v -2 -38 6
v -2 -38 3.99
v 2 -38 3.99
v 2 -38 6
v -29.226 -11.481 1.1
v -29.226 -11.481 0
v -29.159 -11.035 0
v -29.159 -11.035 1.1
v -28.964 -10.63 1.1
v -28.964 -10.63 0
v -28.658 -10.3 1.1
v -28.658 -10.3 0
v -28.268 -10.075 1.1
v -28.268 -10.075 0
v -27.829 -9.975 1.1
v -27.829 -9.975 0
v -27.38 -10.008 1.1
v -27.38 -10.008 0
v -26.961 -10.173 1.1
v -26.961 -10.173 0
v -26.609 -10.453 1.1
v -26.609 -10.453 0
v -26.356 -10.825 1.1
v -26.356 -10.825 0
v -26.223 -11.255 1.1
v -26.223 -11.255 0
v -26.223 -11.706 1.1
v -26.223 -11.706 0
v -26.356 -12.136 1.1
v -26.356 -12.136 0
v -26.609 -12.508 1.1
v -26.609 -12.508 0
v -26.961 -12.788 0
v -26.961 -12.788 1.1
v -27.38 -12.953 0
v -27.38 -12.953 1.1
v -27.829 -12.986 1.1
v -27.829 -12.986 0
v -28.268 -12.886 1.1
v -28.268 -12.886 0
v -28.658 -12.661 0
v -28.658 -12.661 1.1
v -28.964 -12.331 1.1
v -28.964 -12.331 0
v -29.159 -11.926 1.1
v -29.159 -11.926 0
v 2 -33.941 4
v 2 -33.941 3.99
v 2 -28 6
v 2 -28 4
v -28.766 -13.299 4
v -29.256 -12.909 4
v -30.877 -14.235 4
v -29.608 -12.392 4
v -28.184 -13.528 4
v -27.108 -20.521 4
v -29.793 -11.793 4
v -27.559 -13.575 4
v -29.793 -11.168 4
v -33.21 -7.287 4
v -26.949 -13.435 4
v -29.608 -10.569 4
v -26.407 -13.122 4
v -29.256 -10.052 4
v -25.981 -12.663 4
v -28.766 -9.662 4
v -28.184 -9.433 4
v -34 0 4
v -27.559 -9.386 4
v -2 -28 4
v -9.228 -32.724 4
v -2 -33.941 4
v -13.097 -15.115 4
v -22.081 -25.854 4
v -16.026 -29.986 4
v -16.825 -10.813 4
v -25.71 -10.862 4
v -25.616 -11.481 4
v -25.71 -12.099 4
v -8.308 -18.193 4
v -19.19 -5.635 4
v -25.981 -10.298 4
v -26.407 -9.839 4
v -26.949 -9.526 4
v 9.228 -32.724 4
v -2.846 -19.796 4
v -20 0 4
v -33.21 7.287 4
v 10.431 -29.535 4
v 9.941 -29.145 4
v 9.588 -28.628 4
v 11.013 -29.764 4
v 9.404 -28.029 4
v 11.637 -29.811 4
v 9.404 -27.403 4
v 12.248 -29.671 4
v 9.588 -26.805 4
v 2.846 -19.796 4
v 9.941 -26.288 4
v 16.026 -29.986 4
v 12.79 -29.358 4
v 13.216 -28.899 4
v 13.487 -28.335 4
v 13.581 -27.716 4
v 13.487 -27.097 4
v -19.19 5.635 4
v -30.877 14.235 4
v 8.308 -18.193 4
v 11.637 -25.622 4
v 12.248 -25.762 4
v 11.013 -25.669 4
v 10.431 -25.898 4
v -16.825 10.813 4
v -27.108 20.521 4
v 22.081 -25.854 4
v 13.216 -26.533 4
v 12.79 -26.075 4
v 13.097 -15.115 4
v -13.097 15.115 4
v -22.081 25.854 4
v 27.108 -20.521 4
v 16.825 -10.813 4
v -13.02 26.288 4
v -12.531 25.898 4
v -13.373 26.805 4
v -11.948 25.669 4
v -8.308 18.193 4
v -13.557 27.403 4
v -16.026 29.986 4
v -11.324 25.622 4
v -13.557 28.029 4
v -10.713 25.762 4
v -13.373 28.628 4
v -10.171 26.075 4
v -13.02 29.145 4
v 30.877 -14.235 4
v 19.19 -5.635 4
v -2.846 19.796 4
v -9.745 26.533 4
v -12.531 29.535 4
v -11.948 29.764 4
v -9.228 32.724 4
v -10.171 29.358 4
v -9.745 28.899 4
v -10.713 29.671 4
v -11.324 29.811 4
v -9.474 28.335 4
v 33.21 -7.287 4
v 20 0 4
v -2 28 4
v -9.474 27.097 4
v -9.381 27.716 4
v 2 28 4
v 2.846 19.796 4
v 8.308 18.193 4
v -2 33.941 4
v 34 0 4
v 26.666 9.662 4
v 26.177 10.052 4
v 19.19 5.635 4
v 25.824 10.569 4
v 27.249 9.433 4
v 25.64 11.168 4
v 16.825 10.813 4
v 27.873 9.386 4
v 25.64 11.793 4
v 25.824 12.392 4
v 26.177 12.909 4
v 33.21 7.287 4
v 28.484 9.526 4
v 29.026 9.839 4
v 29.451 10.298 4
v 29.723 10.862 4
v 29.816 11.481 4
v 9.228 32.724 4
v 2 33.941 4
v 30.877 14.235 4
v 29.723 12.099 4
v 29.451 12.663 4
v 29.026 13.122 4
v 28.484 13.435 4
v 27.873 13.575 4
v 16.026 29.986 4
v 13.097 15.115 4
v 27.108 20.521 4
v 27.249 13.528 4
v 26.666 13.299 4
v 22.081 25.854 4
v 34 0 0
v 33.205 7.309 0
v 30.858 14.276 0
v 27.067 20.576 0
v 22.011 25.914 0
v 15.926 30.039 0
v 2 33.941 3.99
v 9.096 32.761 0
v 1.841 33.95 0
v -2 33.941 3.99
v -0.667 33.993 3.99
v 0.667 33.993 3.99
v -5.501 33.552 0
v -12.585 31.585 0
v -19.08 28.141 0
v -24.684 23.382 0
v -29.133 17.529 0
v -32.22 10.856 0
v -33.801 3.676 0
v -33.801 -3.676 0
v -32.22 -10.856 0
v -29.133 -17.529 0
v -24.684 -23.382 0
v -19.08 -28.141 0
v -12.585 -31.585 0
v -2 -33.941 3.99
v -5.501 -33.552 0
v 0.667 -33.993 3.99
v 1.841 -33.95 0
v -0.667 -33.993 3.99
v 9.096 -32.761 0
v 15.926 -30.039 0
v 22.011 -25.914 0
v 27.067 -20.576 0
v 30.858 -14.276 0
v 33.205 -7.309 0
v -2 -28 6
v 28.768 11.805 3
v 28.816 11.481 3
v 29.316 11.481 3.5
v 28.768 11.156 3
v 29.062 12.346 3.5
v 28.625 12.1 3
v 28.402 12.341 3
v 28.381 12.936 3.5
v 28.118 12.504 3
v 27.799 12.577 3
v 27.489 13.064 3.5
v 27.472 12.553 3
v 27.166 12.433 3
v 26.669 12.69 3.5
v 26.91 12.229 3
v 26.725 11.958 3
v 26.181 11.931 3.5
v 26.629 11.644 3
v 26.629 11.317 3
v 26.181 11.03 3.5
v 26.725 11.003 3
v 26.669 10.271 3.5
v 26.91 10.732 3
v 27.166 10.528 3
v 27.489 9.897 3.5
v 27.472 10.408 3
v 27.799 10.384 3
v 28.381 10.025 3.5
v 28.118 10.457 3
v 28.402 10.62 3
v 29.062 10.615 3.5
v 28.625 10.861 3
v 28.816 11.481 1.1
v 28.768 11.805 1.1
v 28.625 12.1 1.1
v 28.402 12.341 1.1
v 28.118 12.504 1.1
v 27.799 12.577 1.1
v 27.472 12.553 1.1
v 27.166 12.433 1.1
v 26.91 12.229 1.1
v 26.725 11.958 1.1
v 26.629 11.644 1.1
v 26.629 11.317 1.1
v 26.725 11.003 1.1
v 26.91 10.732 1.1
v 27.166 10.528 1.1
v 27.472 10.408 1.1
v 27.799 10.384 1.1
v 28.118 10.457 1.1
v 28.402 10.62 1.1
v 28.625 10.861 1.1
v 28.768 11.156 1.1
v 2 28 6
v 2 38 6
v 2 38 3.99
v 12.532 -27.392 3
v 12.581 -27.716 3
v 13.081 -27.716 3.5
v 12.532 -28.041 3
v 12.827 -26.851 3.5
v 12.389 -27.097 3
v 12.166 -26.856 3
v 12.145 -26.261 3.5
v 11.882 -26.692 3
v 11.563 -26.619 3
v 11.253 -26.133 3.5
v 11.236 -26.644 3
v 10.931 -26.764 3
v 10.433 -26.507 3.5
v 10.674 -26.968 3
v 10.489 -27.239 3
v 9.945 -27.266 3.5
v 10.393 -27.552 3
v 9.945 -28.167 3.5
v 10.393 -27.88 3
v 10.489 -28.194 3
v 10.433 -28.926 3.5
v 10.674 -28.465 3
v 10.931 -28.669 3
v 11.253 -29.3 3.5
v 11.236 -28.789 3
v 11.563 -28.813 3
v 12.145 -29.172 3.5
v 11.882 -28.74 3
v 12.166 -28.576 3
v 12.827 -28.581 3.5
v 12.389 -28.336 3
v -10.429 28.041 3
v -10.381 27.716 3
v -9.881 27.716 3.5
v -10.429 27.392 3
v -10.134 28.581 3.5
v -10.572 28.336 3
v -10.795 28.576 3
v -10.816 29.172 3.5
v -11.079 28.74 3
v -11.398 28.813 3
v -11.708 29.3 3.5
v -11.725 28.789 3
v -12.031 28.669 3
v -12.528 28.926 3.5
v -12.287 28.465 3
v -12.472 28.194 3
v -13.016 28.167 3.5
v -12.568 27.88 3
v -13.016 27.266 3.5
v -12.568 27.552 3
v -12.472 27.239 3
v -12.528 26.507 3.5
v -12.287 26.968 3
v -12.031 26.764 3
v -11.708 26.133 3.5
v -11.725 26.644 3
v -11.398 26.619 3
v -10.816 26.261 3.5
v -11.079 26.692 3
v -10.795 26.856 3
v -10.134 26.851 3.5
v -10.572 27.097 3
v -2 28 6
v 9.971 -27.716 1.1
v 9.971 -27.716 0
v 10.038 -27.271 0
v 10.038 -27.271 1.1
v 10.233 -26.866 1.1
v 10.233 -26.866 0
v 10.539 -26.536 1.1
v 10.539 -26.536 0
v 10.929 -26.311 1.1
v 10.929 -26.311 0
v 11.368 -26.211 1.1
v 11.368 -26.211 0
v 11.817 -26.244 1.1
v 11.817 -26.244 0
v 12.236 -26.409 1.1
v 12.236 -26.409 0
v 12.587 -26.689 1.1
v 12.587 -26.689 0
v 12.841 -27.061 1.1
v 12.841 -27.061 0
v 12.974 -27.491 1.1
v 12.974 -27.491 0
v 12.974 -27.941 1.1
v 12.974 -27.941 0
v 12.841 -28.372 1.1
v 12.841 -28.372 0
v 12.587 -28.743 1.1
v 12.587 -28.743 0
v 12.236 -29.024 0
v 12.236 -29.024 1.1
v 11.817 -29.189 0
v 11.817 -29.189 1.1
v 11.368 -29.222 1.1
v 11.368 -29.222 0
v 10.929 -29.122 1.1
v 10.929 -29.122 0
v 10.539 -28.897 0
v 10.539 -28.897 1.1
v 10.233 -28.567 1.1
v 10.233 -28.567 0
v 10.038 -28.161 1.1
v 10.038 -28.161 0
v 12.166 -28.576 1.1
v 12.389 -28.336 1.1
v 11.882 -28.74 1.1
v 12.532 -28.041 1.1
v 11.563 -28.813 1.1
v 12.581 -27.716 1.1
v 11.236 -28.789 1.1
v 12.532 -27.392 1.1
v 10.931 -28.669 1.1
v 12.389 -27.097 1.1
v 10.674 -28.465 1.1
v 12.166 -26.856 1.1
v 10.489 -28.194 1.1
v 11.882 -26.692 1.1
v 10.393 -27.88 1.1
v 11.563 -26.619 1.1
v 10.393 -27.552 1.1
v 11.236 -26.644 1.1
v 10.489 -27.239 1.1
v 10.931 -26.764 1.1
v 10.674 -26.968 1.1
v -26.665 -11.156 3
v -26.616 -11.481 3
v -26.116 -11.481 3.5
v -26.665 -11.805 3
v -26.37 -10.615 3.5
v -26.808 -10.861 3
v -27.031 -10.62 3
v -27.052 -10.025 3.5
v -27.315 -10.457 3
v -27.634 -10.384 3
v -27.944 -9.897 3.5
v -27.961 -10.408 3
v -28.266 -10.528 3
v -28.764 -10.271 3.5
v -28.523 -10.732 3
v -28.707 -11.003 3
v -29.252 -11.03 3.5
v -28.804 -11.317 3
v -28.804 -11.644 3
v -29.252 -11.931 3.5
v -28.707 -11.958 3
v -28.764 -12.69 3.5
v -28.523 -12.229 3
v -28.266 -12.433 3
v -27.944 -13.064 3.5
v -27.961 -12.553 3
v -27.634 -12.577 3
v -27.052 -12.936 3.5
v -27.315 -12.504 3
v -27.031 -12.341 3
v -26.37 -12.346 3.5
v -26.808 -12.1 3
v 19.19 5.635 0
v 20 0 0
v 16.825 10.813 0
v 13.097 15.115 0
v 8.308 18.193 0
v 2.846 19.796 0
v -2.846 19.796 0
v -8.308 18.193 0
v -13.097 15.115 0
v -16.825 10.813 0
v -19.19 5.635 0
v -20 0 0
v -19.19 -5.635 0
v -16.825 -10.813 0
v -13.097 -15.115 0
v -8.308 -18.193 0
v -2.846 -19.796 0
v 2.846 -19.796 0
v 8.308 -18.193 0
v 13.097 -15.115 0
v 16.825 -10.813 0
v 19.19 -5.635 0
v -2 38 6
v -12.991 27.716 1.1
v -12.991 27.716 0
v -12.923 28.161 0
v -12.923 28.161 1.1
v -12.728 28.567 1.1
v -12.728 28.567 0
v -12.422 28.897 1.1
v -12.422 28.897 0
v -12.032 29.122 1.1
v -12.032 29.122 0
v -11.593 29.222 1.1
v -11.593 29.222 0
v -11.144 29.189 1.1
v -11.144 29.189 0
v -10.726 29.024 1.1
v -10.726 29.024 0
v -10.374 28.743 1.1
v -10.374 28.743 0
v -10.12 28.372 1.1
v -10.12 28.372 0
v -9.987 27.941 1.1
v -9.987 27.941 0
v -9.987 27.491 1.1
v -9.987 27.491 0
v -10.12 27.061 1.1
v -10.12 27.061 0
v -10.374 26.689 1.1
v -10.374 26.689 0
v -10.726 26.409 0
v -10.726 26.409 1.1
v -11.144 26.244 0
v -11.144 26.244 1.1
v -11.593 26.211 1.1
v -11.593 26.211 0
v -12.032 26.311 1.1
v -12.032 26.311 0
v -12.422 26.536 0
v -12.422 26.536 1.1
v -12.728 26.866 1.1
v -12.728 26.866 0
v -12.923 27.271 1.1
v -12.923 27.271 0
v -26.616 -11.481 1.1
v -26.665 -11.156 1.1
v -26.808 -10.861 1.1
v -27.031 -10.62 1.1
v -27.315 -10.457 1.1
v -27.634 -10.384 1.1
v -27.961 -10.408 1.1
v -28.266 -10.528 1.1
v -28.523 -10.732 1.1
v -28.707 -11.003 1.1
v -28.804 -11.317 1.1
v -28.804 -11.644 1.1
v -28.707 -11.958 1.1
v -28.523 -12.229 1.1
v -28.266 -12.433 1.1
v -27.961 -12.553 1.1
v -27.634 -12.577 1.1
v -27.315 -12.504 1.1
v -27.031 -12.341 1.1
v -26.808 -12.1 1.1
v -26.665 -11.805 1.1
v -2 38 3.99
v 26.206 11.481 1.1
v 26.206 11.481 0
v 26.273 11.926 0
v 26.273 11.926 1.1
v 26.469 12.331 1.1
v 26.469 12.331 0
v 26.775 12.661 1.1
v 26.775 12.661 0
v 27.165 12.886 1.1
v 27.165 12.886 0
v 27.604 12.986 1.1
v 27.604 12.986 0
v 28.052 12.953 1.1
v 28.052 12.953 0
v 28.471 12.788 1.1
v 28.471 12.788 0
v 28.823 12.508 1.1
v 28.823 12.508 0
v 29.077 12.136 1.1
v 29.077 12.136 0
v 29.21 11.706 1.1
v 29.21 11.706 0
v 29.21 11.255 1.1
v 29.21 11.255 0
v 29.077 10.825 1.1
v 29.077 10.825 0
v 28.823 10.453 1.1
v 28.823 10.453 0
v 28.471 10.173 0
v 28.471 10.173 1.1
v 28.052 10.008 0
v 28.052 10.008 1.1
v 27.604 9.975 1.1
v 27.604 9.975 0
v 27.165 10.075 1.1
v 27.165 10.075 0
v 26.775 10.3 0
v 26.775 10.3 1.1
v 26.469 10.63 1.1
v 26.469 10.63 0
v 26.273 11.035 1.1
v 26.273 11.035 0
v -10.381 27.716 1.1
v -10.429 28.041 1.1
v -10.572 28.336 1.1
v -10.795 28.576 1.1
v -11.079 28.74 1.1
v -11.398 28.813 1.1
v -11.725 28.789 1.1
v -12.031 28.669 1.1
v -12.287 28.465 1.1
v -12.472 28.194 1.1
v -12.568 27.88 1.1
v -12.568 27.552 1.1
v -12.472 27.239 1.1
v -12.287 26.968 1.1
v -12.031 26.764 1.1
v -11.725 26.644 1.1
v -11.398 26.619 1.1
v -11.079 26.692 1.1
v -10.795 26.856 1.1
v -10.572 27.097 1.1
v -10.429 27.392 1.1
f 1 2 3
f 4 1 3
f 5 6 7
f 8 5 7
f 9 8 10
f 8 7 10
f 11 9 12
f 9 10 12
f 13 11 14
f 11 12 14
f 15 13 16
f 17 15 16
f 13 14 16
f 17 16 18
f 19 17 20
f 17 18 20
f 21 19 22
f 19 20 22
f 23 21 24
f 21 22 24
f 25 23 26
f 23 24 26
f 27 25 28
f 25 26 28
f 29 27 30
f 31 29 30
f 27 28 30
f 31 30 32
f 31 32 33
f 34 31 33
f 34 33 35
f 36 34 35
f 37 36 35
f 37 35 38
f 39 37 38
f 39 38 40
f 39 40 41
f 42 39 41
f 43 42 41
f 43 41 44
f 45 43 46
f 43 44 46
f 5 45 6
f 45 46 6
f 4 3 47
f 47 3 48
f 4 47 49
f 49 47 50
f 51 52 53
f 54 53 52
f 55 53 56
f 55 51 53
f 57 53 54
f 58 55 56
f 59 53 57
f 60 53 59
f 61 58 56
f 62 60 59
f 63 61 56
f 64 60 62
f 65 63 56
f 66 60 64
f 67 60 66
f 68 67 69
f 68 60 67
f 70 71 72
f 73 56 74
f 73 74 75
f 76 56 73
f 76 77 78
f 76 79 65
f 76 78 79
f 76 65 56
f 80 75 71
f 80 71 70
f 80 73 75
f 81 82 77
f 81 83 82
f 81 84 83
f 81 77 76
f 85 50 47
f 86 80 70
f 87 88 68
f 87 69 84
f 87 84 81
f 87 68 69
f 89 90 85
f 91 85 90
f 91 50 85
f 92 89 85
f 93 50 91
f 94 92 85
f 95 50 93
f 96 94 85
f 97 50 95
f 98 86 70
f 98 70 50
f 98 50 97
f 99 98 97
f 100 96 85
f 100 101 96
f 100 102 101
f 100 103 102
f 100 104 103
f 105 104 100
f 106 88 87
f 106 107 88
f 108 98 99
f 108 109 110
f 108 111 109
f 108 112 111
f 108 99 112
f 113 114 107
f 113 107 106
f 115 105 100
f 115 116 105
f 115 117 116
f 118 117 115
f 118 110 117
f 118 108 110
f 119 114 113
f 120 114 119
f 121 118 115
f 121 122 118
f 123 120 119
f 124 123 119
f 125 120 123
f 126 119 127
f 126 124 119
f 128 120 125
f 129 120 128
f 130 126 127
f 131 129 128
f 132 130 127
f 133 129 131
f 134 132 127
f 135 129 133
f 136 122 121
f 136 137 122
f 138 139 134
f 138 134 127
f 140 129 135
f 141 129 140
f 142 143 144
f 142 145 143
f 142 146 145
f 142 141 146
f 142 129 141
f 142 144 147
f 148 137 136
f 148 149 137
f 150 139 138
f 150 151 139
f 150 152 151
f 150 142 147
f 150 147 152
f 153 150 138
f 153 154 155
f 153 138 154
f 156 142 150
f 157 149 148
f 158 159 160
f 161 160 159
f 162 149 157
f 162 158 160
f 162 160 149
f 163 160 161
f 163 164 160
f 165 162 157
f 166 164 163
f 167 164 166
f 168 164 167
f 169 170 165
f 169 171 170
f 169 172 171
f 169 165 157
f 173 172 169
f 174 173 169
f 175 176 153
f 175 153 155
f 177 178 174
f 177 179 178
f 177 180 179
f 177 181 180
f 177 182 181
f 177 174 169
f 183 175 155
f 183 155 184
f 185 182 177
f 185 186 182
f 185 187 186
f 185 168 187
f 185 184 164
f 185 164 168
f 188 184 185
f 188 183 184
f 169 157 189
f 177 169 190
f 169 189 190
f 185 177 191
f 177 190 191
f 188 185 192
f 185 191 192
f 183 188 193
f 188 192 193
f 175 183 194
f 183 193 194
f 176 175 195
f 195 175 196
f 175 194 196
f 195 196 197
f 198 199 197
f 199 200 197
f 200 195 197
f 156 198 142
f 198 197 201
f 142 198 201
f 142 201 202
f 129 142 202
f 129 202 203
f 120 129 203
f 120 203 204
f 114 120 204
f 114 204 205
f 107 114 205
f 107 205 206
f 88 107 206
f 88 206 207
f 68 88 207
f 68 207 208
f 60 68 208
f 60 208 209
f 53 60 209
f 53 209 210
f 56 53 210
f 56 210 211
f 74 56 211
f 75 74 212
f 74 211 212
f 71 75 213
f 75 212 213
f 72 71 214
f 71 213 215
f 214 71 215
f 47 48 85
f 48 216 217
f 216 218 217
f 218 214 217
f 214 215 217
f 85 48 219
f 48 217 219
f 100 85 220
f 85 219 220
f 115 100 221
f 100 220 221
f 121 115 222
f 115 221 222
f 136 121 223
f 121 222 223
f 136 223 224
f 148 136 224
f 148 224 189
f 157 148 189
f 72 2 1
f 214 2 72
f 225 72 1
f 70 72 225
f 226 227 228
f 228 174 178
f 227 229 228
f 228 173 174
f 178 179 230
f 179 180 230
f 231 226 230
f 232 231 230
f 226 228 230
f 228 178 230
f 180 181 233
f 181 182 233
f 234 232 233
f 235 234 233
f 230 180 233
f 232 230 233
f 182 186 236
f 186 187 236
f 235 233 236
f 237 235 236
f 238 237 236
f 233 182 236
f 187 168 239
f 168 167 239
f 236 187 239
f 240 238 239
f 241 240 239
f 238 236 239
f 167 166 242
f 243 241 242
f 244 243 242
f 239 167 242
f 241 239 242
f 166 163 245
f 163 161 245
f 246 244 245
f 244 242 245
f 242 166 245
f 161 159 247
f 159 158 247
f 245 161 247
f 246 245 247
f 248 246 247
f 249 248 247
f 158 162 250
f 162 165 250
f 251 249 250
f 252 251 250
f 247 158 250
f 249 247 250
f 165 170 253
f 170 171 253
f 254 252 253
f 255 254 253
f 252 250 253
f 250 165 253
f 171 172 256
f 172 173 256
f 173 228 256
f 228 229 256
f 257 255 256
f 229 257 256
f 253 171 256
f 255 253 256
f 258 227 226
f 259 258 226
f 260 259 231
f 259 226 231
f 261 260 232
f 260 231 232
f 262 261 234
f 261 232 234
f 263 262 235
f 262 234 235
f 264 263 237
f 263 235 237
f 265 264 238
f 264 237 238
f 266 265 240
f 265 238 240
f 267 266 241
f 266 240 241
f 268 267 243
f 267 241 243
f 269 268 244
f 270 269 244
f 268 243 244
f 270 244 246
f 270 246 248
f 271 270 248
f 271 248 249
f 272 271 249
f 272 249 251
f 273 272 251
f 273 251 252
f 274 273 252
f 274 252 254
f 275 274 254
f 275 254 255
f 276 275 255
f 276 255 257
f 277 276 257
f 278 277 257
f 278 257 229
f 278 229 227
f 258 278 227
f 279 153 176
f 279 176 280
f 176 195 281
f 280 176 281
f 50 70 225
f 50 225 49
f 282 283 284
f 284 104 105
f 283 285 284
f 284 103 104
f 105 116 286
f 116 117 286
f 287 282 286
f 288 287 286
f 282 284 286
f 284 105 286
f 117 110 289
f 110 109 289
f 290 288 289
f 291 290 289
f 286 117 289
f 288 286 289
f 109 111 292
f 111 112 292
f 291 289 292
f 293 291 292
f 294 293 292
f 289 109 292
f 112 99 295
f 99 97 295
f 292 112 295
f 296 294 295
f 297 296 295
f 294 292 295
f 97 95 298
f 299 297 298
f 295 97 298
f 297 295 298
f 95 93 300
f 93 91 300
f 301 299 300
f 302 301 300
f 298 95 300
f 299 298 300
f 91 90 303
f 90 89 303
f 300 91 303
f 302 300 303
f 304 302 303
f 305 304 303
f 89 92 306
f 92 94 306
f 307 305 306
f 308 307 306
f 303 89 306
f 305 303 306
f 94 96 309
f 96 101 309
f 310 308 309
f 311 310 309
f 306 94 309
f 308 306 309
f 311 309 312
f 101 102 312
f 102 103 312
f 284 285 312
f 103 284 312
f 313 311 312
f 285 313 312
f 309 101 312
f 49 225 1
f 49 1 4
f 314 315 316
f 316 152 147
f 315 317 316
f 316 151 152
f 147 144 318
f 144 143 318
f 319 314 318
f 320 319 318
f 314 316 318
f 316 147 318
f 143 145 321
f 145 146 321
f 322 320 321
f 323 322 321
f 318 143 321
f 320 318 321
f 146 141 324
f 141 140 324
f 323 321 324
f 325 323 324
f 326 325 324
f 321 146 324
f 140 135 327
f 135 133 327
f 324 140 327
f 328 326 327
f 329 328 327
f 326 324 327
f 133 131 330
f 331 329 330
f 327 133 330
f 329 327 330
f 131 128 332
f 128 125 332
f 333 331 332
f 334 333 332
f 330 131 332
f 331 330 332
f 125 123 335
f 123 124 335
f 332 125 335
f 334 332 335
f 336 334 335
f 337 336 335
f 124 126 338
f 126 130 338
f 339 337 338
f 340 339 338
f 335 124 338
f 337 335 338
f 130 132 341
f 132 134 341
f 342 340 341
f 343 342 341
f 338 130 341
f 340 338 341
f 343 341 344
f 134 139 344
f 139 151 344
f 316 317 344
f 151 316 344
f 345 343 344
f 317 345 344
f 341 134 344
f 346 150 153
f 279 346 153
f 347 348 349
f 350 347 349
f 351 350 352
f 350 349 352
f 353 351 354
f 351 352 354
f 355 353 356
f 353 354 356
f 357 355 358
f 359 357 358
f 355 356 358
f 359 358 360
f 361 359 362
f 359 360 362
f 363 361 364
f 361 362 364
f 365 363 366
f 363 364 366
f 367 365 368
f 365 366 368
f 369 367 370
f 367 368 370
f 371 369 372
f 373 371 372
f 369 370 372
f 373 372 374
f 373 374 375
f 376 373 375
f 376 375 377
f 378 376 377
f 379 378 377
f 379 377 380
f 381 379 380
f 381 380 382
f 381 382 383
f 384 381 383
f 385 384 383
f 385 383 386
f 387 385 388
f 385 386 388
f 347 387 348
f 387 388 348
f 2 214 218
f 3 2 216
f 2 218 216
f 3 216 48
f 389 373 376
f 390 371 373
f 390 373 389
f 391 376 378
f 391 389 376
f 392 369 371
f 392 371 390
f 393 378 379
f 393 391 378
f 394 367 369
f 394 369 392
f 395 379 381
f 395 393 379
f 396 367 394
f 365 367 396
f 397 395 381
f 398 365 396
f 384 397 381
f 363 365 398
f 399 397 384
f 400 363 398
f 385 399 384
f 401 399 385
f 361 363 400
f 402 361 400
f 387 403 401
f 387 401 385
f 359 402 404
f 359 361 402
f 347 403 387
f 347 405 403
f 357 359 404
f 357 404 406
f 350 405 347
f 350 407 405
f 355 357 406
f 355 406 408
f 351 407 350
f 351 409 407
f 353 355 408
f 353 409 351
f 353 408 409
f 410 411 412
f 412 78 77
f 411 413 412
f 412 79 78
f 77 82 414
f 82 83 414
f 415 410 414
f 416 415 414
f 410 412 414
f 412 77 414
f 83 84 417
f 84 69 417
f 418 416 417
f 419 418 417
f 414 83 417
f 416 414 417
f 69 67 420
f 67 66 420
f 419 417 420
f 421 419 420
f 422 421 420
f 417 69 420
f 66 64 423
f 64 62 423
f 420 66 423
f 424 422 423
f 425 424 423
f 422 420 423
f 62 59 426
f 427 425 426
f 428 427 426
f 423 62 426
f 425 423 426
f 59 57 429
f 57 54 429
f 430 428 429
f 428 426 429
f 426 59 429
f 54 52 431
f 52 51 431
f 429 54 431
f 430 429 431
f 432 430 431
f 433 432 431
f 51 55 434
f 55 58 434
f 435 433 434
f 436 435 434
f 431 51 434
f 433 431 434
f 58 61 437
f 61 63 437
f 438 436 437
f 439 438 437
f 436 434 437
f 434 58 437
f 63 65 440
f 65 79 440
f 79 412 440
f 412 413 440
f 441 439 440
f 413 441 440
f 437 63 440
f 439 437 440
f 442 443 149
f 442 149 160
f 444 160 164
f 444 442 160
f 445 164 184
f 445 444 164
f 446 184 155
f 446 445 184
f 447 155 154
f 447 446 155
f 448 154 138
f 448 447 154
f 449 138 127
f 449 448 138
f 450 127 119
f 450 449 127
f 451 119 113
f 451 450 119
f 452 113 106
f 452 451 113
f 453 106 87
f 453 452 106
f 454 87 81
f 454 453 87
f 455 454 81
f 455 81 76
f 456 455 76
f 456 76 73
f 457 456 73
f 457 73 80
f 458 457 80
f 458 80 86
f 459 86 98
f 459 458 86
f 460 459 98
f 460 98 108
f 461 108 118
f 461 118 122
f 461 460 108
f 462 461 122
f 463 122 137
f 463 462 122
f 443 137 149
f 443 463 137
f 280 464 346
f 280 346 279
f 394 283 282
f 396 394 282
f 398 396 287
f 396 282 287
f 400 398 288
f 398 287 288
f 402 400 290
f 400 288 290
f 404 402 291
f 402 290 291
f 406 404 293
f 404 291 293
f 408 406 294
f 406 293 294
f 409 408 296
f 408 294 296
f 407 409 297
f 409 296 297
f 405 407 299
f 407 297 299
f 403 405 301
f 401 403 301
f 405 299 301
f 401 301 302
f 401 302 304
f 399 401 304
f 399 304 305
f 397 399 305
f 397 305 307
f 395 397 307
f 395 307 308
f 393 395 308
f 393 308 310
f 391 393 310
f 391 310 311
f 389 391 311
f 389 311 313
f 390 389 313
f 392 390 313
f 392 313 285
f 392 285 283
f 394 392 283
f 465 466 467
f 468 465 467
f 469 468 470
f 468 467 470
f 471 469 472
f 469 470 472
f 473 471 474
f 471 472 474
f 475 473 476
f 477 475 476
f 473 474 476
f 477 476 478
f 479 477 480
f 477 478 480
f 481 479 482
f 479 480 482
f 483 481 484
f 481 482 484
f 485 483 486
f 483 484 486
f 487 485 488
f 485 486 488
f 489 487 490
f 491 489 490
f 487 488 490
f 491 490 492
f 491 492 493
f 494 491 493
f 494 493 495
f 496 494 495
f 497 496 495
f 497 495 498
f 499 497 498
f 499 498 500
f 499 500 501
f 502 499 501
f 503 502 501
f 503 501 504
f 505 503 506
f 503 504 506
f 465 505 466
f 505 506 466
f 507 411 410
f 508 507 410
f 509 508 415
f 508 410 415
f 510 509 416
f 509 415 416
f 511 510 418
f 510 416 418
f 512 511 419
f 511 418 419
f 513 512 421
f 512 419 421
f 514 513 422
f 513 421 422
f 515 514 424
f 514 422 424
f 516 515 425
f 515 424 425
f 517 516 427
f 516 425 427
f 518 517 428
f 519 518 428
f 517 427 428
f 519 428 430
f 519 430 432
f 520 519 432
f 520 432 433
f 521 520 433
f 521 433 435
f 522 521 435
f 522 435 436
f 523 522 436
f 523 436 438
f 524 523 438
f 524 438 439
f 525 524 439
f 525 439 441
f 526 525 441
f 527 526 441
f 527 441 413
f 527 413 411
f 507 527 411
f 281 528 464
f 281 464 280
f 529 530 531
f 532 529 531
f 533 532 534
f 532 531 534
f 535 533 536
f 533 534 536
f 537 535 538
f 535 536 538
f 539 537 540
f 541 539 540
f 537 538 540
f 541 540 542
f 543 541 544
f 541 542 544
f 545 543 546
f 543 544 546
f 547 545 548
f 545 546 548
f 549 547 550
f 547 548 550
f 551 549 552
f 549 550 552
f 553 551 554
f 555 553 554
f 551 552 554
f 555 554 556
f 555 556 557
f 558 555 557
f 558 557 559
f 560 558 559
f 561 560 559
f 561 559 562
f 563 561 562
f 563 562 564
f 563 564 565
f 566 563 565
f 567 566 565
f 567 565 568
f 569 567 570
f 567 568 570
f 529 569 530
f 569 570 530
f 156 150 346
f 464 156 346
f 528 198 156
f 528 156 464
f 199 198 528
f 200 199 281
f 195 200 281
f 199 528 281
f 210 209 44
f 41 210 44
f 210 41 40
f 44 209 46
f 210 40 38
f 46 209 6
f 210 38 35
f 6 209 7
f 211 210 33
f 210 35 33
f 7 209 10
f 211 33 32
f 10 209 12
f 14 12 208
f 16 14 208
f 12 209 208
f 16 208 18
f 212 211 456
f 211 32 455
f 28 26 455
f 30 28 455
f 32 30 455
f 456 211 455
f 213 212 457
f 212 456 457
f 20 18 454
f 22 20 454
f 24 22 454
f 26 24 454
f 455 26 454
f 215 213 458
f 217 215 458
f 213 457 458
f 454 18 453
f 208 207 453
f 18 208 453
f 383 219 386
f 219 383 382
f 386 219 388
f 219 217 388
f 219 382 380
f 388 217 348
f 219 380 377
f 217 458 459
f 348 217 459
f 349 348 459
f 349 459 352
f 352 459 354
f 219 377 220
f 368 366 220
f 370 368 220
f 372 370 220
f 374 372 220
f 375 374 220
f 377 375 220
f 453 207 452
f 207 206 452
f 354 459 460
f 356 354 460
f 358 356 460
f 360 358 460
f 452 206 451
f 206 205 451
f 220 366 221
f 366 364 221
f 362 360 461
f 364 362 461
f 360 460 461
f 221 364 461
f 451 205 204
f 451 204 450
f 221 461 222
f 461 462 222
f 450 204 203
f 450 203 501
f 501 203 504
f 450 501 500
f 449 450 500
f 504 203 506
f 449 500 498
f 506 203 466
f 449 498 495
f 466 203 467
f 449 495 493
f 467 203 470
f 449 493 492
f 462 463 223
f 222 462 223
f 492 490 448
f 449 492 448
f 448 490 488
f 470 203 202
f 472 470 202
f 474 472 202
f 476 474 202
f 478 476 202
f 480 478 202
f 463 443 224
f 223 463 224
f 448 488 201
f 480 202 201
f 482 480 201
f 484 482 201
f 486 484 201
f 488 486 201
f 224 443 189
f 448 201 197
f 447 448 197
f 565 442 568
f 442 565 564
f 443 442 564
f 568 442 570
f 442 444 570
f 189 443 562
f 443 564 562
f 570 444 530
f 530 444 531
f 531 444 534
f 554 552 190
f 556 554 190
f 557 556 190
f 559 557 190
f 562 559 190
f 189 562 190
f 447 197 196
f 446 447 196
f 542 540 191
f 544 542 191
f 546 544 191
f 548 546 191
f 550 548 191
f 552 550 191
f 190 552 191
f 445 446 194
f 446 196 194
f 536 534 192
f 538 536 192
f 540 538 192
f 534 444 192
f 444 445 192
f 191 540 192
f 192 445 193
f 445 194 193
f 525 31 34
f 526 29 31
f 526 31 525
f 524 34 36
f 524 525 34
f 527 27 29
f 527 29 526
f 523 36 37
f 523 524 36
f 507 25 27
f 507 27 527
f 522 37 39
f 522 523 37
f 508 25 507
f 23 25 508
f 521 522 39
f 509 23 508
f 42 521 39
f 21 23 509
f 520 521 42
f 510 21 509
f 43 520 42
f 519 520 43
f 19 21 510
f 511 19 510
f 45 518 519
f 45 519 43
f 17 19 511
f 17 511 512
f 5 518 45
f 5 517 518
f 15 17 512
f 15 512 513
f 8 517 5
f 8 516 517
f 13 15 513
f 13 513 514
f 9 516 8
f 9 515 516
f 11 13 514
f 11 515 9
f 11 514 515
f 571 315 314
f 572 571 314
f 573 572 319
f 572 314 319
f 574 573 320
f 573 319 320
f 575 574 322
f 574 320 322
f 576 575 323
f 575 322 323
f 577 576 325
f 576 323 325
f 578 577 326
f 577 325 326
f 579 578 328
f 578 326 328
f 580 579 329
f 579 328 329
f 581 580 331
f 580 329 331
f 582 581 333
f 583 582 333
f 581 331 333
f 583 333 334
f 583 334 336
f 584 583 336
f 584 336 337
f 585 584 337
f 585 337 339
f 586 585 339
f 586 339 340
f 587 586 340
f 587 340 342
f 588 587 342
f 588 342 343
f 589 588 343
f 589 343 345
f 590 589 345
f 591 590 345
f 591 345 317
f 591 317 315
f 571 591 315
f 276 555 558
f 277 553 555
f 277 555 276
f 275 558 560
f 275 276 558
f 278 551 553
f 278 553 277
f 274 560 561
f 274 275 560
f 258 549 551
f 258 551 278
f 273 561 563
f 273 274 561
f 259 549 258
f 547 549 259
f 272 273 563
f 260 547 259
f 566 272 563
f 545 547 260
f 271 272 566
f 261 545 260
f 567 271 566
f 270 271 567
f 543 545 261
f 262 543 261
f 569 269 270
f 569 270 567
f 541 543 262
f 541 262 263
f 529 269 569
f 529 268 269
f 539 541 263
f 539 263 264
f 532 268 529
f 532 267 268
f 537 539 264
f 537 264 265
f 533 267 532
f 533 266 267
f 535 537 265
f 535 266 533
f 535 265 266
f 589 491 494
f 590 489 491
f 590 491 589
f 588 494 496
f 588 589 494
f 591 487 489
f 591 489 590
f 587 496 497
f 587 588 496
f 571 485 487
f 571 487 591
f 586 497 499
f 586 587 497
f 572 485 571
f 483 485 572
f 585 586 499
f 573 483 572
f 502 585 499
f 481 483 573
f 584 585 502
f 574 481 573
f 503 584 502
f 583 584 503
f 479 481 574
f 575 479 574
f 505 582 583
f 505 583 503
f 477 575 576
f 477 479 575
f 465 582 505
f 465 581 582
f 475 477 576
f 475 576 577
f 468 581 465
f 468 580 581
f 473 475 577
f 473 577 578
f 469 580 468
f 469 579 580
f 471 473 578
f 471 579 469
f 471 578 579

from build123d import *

# Parameters (mm, degrees)
SKETCH1_R                                    = 34
SKETCH1_R_2                                  = 20
OUTPUT_PLATE_DEPTH                           = 4
Y_TONGUE_1_START                             = 3.99
SKETCH2_W                                    = 4
SKETCH2_H                                    = 10
Y_TONGUE_1_DEPTH                             = 2.01
SKETCH3_W                                    = 4
SKETCH3_H                                    = 10
Y_TONGUE_1_2_DEPTH                           = 2.01
SKETCH4_R                                    = 1.1
FOUR_M2_CLEARANCE_DEPTH                      = 4.01
SKETCH5_R                                    = 2.1
FOUR_90DEG_COUNTERSINKS_D4P2_DEPTH           = 1.1
FOUR_90DEG_COUNTERSINKS_D4P2_DRAFT           = -45
FOUR_90DEG_COUNTERSINKS_D4P2_PROFILE_2_DEPTH = 1.1
FOUR_90DEG_COUNTERSINKS_D4P2_PROFILE_2_DRAFT = -45
FOUR_90DEG_COUNTERSINKS_D4P2_PROFILE_3_DEPTH = 1.1
FOUR_90DEG_COUNTERSINKS_D4P2_PROFILE_3_DRAFT = -45
FOUR_90DEG_COUNTERSINKS_D4P2_PROFILE_4_DEPTH = 1.1
FOUR_90DEG_COUNTERSINKS_D4P2_PROFILE_4_DRAFT = -45
SKETCH6_R                                    = 1.51
FOUR_STANDOFF_PILOT_POCKETS_D3P02_DEPTH      = 1.1


with BuildPart() as part:
    # Sketch1 → Output_Plate (new body)
    with BuildSketch(Plane.XY):
        Circle(SKETCH1_R)
        Circle(SKETCH1_R_2, mode=Mode.SUBTRACT)
    extrude(amount=OUTPUT_PLATE_DEPTH)

    # Sketch2 → Y_Tongue_-1 (add)
    with BuildSketch(Plane.XY.offset(Y_TONGUE_1_START)):
        with Locations((0, -33)):
            Rectangle(SKETCH2_W, SKETCH2_H)
    extrude(amount=Y_TONGUE_1_DEPTH)

    # Sketch3 → Y_Tongue_1 2 (add)
    with BuildSketch(Plane.XY.offset(Y_TONGUE_1_START)):
        with Locations((0, 33)):
            Rectangle(SKETCH3_W, SKETCH3_H)
    extrude(amount=Y_TONGUE_1_2_DEPTH)

    # Sketch4 → Four_M2_Clearance (cut)
    with BuildSketch(Plane.XY.offset(4)):
        with Locations((27.716385975, 11.480502971)):
            Circle(SKETCH4_R)
        with Locations((-11.480502971, 27.716385975)):
            Circle(SKETCH4_R)
        with Locations((-27.716385975, -11.480502971)):
            Circle(SKETCH4_R)
        with Locations((11.480502971, -27.716385975)):
            Circle(SKETCH4_R)
    extrude(amount=-FOUR_M2_CLEARANCE_DEPTH, mode=Mode.SUBTRACT)


with BuildPart() as four_90deg_countersinks_d4p2_tool:
    # Sketch5 → Four_90deg_Countersinks_D4p2 (with draft: the straight prism first)
    with BuildSketch(Plane.XY.offset(4)):
        with Locations((27.716385975, 11.480502971)):
            Circle(SKETCH5_R)
    extrude(amount=-FOUR_90DEG_COUNTERSINKS_D4P2_DEPTH)
    # Four_90deg_Countersinks_D4p2: the draft: its side faces are tilted about the plane it starts from
    four_90deg_countersinks_d4p2_sides = [four_90deg_countersinks_d4p2_tool.faces().sort_by_distance(p)[0] for p in [
        (25.616385975, 11.480502971, 3.45),
    ]]
    draft(four_90deg_countersinks_d4p2_sides, Plane.XY.offset(4), FOUR_90DEG_COUNTERSINKS_D4P2_DRAFT)


with BuildPart() as part_1:
    add(part.part)

    # Four_90deg_Countersinks_D4p2: cut by four_90deg_countersinks_d4p2_tool
    add(four_90deg_countersinks_d4p2_tool.part, mode=Mode.SUBTRACT)


with BuildPart() as four_90deg_countersinks_d4p2_profile_2_tool:
    # Sketch5 → Four_90deg_Countersinks_D4p2 profile 2 (with draft: the straight prism first)
    with BuildSketch(Plane.XY.offset(4)):
        with Locations((-11.480502971, 27.716385975)):
            Circle(SKETCH5_R)
    extrude(amount=-FOUR_90DEG_COUNTERSINKS_D4P2_PROFILE_2_DEPTH)
    # Four_90deg_Countersinks_D4p2 profile 2: the draft: its side faces are tilted about the plane it starts from
    four_90deg_countersinks_d4p2_profile_2_sides = [four_90deg_countersinks_d4p2_profile_2_tool.faces().sort_by_distance(p)[0] for p in [
        (-13.580502971, 27.716385975, 3.45),
    ]]
    draft(four_90deg_countersinks_d4p2_profile_2_sides, Plane.XY.offset(4), FOUR_90DEG_COUNTERSINKS_D4P2_PROFILE_2_DRAFT)


with BuildPart() as part_2:
    add(part_1.part)

    # Four_90deg_Countersinks_D4p2 profile 2: cut by four_90deg_countersinks_d4p2_profile_2_tool
    add(four_90deg_countersinks_d4p2_profile_2_tool.part, mode=Mode.SUBTRACT)


with BuildPart() as four_90deg_countersinks_d4p2_profile_3_tool:
    # Sketch5 → Four_90deg_Countersinks_D4p2 profile 3 (with draft: the straight prism first)
    with BuildSketch(Plane.XY.offset(4)):
        with Locations((-27.716385975, -11.480502971)):
            Circle(SKETCH5_R)
    extrude(amount=-FOUR_90DEG_COUNTERSINKS_D4P2_PROFILE_3_DEPTH)
    # Four_90deg_Countersinks_D4p2 profile 3: the draft: its side faces are tilted about the plane it starts from
    four_90deg_countersinks_d4p2_profile_3_sides = [four_90deg_countersinks_d4p2_profile_3_tool.faces().sort_by_distance(p)[0] for p in [
        (-29.816385975, -11.480502971, 3.45),
    ]]
    draft(four_90deg_countersinks_d4p2_profile_3_sides, Plane.XY.offset(4), FOUR_90DEG_COUNTERSINKS_D4P2_PROFILE_3_DRAFT)


with BuildPart() as part_3:
    add(part_2.part)

    # Four_90deg_Countersinks_D4p2 profile 3: cut by four_90deg_countersinks_d4p2_profile_3_tool
    add(four_90deg_countersinks_d4p2_profile_3_tool.part, mode=Mode.SUBTRACT)


with BuildPart() as four_90deg_countersinks_d4p2_profile_4_tool:
    # Sketch5 → Four_90deg_Countersinks_D4p2 profile 4 (with draft: the straight prism first)
    with BuildSketch(Plane.XY.offset(4)):
        with Locations((11.480502971, -27.716385975)):
            Circle(SKETCH5_R)
    extrude(amount=-FOUR_90DEG_COUNTERSINKS_D4P2_PROFILE_4_DEPTH)
    # Four_90deg_Countersinks_D4p2 profile 4: the draft: its side faces are tilted about the plane it starts from
    four_90deg_countersinks_d4p2_profile_4_sides = [four_90deg_countersinks_d4p2_profile_4_tool.faces().sort_by_distance(p)[0] for p in [
        (9.380502971, -27.716385975, 3.45),
    ]]
    draft(four_90deg_countersinks_d4p2_profile_4_sides, Plane.XY.offset(4), FOUR_90DEG_COUNTERSINKS_D4P2_PROFILE_4_DRAFT)


with BuildPart() as part_4:
    add(part_3.part)

    # Four_90deg_Countersinks_D4p2 profile 4: cut by four_90deg_countersinks_d4p2_profile_4_tool
    add(four_90deg_countersinks_d4p2_profile_4_tool.part, mode=Mode.SUBTRACT)

    # Sketch6 → Four_Standoff_Pilot_Pockets_D3p02 (cut)
    with BuildSketch(Plane(origin=(0, 0, 0), x_dir=(-1, 0, 0), z_dir=(0, 0, -1))):
        with Locations((-27.716385975, 11.480502971)):
            Circle(SKETCH6_R)
        with Locations((11.480502971, 27.716385975)):
            Circle(SKETCH6_R)
        with Locations((27.716385975, -11.480502971)):
            Circle(SKETCH6_R)
        with Locations((-11.480502971, -27.716385975)):
            Circle(SKETCH6_R)
    extrude(amount=-FOUR_STANDOFF_PILOT_POCKETS_D3P02_DEPTH, mode=Mode.SUBTRACT)


solid = part_4.part
